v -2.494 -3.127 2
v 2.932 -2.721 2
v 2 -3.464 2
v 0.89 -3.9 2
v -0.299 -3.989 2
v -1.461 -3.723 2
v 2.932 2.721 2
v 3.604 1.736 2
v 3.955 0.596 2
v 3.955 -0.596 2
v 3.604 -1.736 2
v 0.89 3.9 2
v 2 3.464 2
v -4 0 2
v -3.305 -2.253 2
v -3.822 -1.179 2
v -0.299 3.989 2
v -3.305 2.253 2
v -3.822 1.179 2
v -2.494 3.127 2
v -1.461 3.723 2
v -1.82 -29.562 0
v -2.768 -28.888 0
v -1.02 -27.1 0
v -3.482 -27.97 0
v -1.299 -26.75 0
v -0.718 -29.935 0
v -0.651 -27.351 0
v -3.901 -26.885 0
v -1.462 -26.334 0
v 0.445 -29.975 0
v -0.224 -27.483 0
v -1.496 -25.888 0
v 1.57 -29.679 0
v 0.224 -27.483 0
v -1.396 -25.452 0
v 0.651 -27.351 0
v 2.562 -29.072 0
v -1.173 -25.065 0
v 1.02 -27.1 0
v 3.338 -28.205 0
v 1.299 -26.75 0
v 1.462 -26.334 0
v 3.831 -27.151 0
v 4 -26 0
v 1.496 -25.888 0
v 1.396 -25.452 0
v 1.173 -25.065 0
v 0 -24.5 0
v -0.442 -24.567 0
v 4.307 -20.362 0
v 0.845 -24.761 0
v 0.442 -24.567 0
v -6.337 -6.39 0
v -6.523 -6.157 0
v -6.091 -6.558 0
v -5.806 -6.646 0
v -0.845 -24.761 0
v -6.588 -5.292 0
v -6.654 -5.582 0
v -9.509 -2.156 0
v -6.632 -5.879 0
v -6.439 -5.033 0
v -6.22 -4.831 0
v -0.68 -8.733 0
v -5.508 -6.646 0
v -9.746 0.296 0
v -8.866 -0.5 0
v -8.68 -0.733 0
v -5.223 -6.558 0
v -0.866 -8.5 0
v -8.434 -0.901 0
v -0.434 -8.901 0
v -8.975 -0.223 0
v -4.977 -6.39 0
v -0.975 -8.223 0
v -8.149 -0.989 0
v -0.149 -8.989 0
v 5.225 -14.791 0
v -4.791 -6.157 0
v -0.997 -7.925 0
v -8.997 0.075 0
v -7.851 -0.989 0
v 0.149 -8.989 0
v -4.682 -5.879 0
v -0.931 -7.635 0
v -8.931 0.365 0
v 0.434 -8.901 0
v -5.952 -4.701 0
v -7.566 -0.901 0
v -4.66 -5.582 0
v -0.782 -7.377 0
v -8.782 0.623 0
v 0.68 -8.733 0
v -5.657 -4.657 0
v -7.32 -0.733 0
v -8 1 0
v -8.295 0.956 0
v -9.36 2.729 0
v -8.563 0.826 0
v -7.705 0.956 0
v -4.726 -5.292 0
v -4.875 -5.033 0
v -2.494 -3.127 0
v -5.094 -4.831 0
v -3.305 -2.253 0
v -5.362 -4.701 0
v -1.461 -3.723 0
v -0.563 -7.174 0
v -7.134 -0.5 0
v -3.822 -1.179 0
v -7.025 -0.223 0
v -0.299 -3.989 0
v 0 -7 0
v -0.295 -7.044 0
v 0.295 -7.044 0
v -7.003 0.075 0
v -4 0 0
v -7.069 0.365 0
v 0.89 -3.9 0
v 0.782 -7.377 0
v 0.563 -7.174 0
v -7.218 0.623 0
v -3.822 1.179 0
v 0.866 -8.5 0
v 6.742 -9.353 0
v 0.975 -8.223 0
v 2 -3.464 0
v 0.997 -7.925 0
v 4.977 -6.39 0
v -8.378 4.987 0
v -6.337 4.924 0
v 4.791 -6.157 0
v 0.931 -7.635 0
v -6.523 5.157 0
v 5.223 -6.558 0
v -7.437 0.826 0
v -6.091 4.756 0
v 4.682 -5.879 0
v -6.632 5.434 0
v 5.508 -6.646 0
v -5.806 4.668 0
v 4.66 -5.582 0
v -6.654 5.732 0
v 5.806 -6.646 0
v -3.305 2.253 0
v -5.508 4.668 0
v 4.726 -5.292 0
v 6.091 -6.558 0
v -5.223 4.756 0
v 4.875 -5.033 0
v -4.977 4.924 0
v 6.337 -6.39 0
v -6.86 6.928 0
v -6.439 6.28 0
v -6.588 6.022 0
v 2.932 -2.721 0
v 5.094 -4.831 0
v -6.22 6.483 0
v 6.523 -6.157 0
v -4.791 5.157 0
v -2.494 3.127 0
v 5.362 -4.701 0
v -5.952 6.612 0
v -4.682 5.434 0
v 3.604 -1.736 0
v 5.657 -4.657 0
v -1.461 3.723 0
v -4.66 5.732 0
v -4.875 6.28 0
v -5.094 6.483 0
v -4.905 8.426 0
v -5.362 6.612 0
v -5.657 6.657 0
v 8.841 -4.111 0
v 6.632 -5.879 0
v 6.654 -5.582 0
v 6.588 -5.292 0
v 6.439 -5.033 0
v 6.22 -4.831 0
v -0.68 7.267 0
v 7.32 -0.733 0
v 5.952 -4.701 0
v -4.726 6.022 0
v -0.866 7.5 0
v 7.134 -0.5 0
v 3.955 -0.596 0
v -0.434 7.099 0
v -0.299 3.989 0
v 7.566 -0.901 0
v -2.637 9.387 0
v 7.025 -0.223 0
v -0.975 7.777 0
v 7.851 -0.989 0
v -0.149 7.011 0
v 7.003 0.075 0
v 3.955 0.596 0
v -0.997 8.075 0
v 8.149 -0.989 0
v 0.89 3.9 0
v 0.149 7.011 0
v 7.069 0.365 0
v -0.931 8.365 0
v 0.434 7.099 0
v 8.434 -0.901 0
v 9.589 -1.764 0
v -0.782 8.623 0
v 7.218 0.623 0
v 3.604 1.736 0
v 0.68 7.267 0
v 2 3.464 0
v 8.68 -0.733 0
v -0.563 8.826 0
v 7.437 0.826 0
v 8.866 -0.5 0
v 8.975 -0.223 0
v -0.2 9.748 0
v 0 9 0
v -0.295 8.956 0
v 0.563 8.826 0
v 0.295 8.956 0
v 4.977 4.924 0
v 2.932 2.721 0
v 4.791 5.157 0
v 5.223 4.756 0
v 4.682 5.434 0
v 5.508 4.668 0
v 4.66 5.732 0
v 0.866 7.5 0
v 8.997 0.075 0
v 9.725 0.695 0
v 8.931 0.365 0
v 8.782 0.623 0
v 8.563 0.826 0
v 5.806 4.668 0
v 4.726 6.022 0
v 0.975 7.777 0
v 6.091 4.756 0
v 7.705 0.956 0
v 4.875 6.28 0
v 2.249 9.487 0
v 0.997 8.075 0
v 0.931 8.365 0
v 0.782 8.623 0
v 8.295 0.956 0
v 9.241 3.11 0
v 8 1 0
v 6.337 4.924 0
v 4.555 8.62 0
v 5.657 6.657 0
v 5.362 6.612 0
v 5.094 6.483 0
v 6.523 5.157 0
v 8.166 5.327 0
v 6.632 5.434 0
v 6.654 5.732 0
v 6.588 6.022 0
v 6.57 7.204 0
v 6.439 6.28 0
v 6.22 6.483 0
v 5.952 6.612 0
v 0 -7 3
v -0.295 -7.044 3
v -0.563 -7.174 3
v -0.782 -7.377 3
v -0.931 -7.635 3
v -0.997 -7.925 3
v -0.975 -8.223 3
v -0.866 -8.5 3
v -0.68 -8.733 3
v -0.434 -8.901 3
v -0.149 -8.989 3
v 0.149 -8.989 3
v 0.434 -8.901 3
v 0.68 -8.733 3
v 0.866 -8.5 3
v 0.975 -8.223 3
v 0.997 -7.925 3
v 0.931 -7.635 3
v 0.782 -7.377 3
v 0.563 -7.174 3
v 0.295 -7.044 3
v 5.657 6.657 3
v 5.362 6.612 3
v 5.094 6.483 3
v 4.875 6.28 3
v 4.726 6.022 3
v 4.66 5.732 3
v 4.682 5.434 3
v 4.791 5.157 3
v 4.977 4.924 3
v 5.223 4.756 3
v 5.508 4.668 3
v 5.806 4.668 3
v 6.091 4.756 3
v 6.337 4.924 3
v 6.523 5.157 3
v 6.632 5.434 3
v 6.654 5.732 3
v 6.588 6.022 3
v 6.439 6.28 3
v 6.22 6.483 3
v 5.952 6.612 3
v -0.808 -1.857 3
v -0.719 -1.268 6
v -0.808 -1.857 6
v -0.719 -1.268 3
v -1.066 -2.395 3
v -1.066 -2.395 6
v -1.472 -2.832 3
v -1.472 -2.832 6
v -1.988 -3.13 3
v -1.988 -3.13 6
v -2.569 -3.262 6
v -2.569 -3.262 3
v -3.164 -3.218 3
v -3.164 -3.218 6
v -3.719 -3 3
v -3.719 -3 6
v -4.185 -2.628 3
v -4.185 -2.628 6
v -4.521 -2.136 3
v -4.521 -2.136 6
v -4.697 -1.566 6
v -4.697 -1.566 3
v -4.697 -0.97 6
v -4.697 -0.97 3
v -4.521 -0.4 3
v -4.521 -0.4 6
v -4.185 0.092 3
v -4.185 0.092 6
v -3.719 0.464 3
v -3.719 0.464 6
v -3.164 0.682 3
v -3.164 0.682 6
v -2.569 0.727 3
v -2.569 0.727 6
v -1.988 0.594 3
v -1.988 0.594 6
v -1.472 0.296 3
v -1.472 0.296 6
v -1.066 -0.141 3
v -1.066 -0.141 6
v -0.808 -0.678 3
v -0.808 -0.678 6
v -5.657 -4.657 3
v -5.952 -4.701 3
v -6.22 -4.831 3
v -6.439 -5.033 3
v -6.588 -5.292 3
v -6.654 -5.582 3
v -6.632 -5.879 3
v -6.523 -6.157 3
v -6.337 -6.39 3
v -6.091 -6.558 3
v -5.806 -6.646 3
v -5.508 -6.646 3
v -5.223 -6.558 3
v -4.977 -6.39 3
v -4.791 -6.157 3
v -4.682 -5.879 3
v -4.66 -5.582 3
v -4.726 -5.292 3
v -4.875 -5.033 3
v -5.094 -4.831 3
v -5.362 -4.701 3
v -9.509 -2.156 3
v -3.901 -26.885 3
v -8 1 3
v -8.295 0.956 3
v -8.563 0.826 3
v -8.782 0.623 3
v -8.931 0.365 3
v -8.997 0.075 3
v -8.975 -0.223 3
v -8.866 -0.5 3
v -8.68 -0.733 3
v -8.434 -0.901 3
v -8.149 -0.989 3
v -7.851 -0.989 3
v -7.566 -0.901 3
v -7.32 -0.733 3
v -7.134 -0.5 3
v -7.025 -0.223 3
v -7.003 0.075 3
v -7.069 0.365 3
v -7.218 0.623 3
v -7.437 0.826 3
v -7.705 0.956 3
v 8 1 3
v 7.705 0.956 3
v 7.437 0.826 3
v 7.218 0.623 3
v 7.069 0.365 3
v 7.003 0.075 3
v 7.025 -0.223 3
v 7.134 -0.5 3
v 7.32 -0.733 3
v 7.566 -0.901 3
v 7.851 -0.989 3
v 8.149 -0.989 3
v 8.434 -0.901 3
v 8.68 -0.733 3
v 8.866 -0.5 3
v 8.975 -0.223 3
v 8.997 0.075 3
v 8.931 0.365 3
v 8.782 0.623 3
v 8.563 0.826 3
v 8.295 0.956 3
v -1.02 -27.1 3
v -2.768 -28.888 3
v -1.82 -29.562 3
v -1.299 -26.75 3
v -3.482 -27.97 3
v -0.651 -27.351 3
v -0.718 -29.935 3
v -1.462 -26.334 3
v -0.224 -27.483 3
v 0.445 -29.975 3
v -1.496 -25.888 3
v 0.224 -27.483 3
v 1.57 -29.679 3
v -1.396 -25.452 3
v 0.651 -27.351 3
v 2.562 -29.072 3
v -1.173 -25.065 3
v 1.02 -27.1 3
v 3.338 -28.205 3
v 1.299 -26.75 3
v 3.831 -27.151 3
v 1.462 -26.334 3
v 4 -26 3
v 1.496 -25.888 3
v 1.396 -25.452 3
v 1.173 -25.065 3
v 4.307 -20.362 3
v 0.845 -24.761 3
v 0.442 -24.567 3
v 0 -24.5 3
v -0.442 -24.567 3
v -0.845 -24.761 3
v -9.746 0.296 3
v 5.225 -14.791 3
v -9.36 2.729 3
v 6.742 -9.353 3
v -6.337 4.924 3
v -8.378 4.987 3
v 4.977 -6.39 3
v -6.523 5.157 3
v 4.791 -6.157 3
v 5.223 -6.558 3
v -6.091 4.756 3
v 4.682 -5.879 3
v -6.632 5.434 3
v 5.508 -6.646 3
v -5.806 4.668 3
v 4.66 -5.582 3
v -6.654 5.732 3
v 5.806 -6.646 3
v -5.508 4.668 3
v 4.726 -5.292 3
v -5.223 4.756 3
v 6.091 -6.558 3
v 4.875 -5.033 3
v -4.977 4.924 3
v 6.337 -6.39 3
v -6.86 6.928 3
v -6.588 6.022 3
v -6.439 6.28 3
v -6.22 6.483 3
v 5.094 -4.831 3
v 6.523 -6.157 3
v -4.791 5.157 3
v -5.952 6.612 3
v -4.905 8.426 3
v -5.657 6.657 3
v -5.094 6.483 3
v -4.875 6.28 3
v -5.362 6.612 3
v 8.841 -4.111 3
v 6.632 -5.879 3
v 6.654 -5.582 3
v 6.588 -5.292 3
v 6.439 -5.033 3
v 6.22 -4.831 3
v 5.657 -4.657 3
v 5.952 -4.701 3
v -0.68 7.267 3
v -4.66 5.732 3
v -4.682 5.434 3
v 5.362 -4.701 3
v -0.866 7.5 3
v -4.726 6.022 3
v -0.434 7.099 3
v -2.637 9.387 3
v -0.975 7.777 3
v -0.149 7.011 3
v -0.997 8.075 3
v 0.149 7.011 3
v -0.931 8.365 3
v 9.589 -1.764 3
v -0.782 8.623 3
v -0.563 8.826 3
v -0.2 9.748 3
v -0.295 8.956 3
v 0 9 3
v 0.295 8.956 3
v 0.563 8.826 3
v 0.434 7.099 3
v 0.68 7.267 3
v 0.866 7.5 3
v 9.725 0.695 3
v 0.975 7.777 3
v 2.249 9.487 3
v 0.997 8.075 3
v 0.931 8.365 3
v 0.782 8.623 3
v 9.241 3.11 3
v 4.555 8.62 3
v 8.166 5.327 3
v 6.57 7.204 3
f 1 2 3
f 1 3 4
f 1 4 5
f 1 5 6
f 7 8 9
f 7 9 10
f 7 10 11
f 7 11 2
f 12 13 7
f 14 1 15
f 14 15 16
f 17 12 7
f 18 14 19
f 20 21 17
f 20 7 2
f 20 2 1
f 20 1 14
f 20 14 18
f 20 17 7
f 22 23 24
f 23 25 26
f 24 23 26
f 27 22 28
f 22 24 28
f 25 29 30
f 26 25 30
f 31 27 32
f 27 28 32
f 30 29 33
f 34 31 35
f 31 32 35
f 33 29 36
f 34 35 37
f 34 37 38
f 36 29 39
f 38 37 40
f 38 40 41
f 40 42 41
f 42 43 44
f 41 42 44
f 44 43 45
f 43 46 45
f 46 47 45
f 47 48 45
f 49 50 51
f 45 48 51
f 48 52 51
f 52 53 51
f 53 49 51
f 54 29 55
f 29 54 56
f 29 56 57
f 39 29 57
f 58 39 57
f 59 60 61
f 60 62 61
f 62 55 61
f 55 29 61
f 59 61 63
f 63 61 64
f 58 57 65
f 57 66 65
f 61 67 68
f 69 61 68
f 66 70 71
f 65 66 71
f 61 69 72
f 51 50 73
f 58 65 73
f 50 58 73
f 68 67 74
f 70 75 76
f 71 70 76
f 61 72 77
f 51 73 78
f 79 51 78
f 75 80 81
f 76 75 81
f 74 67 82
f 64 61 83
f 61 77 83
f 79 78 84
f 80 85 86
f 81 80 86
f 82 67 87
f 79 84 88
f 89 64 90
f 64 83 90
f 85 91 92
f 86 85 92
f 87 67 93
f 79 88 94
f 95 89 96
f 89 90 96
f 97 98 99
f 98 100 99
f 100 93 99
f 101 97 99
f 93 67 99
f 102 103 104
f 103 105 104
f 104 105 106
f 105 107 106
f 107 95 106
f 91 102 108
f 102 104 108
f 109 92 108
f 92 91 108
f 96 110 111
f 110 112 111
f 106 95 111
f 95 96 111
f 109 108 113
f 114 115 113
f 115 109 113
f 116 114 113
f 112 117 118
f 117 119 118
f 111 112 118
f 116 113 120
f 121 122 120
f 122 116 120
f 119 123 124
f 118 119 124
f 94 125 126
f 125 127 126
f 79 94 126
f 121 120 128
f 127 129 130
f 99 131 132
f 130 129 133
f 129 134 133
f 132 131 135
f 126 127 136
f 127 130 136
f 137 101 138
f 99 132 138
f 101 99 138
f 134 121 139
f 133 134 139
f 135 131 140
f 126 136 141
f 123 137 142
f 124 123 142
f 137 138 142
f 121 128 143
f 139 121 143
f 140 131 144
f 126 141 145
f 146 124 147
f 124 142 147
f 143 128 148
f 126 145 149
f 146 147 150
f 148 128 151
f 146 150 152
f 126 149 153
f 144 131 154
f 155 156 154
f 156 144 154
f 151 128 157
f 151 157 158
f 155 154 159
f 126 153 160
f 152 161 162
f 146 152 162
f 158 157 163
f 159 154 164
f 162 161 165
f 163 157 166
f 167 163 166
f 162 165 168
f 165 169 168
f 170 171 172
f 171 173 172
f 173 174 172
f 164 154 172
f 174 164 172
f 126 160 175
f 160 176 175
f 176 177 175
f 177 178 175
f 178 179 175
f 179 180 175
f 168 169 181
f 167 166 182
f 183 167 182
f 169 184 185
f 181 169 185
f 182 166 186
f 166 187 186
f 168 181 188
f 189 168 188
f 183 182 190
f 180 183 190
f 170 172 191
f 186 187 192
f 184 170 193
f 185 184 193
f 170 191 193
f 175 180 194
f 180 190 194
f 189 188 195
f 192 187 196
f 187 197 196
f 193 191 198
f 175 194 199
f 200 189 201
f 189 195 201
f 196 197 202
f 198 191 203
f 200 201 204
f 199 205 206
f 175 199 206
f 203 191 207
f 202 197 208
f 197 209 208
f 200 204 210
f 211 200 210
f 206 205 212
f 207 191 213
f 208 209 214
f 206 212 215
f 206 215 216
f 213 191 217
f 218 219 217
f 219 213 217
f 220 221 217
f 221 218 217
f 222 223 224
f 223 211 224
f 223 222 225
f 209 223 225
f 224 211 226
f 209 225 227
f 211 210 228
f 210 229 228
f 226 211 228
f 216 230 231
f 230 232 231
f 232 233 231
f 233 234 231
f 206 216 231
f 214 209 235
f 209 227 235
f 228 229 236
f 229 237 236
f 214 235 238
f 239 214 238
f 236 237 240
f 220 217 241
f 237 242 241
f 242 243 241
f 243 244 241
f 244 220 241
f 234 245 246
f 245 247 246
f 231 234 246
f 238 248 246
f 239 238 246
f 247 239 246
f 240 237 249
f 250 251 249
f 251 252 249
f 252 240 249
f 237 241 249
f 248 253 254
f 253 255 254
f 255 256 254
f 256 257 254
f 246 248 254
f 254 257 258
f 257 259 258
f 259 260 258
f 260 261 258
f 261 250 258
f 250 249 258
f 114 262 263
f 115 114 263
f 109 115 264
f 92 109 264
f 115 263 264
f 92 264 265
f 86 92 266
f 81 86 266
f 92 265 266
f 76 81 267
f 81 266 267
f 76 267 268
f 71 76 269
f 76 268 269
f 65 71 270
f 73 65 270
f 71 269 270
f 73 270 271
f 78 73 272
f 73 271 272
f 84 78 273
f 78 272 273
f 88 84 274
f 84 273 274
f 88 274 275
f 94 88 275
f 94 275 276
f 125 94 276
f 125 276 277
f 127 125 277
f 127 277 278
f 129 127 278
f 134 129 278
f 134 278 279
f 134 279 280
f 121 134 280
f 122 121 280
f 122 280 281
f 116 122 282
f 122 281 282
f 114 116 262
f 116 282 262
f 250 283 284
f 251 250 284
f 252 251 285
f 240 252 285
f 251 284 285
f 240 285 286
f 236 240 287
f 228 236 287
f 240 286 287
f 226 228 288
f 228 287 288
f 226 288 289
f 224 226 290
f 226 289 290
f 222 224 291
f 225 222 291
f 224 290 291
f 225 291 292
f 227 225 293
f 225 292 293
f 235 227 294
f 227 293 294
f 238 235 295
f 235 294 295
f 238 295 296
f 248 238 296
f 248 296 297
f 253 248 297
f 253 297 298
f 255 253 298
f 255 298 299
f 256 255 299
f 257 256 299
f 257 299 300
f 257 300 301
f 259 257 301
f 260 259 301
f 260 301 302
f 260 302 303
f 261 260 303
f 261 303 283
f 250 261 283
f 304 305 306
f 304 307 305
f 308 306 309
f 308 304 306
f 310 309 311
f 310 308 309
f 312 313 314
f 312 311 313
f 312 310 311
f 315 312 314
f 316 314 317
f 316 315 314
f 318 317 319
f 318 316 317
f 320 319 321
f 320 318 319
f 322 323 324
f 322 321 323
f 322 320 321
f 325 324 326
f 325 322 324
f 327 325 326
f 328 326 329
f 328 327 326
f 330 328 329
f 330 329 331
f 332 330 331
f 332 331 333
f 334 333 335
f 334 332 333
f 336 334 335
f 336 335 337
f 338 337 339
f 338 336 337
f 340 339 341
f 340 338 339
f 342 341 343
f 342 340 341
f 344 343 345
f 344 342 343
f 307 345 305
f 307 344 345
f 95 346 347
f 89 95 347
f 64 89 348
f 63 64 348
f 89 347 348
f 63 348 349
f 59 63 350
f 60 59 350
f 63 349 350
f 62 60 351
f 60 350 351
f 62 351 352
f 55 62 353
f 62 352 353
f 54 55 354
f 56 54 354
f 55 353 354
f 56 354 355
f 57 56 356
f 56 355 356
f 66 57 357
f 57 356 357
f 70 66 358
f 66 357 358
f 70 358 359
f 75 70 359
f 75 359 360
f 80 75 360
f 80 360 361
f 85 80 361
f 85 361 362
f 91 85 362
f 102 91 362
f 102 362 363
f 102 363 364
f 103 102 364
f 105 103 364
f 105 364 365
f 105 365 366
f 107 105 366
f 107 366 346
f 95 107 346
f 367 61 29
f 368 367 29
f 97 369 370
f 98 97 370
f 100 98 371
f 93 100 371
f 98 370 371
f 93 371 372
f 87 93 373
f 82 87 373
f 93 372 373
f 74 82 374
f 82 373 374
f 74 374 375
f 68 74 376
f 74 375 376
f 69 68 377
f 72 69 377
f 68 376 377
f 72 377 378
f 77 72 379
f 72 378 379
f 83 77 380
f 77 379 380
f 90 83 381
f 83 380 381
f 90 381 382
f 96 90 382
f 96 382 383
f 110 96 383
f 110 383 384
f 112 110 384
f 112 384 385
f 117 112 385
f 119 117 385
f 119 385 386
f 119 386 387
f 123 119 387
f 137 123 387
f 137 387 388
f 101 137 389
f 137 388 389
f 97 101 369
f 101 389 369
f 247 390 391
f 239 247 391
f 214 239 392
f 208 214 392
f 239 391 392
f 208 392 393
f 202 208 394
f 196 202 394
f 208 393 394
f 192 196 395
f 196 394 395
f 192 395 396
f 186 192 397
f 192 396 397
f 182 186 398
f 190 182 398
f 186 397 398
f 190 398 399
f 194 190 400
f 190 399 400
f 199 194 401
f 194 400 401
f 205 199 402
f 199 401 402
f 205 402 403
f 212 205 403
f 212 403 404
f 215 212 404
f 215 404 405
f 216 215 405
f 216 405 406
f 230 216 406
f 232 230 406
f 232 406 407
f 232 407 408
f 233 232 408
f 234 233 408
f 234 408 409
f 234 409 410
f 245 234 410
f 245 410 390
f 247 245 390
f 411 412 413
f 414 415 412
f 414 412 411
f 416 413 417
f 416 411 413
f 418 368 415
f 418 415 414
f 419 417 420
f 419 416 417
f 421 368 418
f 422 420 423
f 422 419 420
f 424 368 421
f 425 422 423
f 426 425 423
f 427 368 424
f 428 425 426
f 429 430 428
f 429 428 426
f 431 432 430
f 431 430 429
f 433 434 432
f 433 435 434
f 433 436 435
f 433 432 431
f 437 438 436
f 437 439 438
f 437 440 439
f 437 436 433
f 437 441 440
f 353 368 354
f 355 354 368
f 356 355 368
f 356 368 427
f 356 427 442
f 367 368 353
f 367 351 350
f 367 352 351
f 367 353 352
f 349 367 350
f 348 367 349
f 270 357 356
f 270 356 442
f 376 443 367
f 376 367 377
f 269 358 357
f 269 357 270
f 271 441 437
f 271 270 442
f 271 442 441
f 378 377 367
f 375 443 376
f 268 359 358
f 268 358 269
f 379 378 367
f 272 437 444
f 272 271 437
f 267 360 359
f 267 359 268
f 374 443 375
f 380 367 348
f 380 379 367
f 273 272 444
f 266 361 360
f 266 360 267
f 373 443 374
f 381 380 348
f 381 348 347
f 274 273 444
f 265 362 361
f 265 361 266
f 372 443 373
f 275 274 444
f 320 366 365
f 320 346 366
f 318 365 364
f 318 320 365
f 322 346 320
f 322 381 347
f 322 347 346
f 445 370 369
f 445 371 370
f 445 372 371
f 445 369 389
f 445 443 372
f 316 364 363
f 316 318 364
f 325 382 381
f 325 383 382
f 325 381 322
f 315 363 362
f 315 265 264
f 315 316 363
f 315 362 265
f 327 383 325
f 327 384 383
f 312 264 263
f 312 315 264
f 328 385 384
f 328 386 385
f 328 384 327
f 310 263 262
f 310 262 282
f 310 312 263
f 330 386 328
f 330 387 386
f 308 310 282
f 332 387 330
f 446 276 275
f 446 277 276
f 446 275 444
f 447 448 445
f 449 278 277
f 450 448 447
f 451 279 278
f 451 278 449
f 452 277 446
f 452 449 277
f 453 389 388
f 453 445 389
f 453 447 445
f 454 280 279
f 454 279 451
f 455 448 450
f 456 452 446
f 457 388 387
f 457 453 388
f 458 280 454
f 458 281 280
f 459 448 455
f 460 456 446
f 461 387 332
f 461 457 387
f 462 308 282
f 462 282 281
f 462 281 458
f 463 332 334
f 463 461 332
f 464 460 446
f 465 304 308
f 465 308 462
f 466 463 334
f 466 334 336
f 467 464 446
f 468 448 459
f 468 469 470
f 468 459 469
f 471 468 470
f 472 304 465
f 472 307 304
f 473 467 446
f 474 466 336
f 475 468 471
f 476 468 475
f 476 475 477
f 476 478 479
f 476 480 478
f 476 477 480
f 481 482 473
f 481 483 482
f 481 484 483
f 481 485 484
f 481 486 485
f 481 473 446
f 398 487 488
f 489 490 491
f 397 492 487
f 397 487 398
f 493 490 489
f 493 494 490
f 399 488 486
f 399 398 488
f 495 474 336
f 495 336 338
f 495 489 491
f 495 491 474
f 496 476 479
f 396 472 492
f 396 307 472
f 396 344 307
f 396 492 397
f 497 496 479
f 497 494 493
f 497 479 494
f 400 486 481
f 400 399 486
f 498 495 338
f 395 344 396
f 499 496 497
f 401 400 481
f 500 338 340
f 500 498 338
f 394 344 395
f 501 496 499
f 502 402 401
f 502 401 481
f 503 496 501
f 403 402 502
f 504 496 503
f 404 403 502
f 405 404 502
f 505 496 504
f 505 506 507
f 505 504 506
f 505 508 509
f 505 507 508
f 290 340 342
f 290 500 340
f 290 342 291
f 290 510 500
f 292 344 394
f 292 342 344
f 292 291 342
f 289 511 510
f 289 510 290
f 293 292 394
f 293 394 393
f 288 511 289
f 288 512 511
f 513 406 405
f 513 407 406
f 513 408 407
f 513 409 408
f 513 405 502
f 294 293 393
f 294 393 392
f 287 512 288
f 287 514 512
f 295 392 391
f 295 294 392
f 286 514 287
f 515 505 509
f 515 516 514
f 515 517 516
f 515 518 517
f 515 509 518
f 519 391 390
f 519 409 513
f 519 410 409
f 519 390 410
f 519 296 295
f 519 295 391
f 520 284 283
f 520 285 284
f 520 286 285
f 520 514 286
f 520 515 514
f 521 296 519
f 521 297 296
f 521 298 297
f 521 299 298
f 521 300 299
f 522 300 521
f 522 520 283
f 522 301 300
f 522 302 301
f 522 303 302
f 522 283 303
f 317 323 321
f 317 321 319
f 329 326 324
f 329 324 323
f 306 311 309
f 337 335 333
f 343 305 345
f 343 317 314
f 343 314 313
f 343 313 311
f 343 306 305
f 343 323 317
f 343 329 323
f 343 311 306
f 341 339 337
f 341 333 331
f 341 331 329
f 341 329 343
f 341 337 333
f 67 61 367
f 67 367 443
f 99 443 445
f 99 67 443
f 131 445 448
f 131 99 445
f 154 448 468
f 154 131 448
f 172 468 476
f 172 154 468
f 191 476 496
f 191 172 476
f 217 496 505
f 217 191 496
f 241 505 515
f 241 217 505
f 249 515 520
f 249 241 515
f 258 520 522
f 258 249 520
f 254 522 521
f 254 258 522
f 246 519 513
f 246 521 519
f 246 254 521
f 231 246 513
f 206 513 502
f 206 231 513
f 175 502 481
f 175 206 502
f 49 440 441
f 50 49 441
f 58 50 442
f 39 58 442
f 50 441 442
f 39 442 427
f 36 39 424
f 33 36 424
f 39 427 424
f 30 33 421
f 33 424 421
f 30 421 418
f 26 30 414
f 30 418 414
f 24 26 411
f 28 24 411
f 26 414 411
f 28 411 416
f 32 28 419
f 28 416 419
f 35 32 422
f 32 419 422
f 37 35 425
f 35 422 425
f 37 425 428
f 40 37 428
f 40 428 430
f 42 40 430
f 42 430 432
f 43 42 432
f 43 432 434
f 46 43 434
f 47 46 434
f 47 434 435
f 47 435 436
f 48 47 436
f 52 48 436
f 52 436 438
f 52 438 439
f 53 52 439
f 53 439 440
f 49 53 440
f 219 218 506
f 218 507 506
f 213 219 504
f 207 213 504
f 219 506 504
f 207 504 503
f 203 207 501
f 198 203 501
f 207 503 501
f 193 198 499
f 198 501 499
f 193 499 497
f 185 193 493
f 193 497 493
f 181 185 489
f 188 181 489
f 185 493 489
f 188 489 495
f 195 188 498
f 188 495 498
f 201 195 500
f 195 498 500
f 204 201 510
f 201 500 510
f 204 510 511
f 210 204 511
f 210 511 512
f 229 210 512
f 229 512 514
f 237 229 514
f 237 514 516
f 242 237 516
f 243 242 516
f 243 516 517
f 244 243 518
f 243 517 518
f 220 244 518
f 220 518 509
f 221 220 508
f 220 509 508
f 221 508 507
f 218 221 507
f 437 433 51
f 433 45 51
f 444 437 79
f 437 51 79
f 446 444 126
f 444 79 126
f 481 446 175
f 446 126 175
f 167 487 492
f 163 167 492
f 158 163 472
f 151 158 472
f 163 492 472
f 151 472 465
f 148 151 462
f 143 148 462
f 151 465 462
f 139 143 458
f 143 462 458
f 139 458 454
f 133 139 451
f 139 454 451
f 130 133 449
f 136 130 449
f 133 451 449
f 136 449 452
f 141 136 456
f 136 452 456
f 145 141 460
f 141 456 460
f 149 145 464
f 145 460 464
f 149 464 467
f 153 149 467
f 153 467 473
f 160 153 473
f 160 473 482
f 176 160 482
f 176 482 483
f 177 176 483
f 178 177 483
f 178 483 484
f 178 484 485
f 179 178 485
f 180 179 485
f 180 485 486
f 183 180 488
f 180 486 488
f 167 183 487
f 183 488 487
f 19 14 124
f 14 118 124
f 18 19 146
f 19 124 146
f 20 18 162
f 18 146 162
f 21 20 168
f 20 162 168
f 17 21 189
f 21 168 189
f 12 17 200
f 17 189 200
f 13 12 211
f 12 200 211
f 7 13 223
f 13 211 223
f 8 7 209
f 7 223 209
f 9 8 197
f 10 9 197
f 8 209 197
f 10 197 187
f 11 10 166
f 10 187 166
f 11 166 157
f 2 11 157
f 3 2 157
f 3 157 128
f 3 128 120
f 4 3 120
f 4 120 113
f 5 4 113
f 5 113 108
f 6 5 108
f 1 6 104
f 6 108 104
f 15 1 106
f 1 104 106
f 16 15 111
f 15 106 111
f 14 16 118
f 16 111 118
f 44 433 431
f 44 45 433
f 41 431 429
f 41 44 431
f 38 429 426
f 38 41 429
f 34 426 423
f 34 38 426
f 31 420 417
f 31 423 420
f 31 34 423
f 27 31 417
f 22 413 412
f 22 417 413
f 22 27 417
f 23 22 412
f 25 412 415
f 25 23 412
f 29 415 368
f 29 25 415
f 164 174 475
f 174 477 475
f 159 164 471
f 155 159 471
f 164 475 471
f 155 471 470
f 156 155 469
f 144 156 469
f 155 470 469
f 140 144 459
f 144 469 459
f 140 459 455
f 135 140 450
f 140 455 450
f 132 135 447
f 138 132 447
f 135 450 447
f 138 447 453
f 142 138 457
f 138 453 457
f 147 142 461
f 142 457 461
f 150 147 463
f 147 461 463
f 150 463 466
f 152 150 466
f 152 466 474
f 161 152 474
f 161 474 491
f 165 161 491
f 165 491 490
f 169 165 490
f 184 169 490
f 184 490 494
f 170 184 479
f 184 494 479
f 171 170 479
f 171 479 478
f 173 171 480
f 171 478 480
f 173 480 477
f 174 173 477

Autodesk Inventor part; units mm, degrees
ref_plane "YZ Plane" through (0, 0, 0) normal (1, 0, 0) x (0, 1, 0)
ref_plane "XZ Plane" through (0, 0, 0) normal (0, 1, 0) x (-1, 0, 0)
ref_plane "XY Plane" through (0, 0, 0) normal (0, 0, 1) x (1, 0, 0)
sketch "スケッチ1" plane through (0, 0, 0) normal (0, 0, 1) x (1, 0, 0)
  line L0 (0, 0) -> (-2.7189, -1.2679) construction
  line L1 (0, 0) -> (0, -26) construction
  arc A0 (8.8407, -4.1114) -> (-9.5086, -2.1563) centre (0, 0) ccw
  arc A1 (-3.901, -26.8846) -> (4, -26) centre (0, -26) ccw
  arc A2 (8.8407, -4.1114) -> (4, -26) centre (55.9076, -26) ccw
  line L2 (-9.5086, -2.1563) -> (-3.901, -26.8846)
  line L3 (0, -26) -> (4, -26) construction
  circle A3 centre (0, 0) radius 8 construction
  point P0 (8, 0)
  point P1 (5.6569, 5.6569)
  point P2 (0, 8)
  point P3 (-5.6569, 5.6569)
  point P4 (-8, 0)
  point P5 (-5.6569, -5.6569)
  point P6 (0, -8)
  point P7 (5.6569, -5.6569)
  point P8 (0, -26)
  dimension "d38" = 16
  dimension "d2" = 3
  dimension "d4" = 26
  dimension "d6" = 9.75
  dimension "d7" = 4
  dimension "d11" = 360
  dimension "d37" = 65
extrude "押し出し1" add sketch "スケッチ1" along normal blind 3
hole "穴1" at (8, 0, 0) at (5.6569, 5.6569, 0) at (0, 8, 0) at (-5.6569, 5.6569, 0) at (-8, 0, 0) at (-5.6569, -5.6569, 0) at (0, -8, 0) at (5.6569, -5.6569, 0) direction (0, 0, 1) diameter 2 end through all
hole "穴2" at (0, -26, 0) direction (0, 0, 1) diameter 3 end through all
sketch "スケッチ2" plane through (0, 0, 0) normal (0, 0, -1) x (-1, 0, 0)
  circle A0 centre (0, 0) radius 4
  dimension "d30" = 8
extrude "押し出し2" cut sketch "スケッチ2" against normal blind 2
sketch "スケッチ3" plane through (0, 0, 3) normal (0, 0, 1) x (1, 0, 0)
  circle A0 centre (-2.7189, -1.2679) radius 2
  point P0 (0, 0)
  dimension "d33" = 4
extrude "押し出し3" add sketch "スケッチ3" along normal blind 3
properties part number "COXA_ROLL_SERVO-OUTPUT"
